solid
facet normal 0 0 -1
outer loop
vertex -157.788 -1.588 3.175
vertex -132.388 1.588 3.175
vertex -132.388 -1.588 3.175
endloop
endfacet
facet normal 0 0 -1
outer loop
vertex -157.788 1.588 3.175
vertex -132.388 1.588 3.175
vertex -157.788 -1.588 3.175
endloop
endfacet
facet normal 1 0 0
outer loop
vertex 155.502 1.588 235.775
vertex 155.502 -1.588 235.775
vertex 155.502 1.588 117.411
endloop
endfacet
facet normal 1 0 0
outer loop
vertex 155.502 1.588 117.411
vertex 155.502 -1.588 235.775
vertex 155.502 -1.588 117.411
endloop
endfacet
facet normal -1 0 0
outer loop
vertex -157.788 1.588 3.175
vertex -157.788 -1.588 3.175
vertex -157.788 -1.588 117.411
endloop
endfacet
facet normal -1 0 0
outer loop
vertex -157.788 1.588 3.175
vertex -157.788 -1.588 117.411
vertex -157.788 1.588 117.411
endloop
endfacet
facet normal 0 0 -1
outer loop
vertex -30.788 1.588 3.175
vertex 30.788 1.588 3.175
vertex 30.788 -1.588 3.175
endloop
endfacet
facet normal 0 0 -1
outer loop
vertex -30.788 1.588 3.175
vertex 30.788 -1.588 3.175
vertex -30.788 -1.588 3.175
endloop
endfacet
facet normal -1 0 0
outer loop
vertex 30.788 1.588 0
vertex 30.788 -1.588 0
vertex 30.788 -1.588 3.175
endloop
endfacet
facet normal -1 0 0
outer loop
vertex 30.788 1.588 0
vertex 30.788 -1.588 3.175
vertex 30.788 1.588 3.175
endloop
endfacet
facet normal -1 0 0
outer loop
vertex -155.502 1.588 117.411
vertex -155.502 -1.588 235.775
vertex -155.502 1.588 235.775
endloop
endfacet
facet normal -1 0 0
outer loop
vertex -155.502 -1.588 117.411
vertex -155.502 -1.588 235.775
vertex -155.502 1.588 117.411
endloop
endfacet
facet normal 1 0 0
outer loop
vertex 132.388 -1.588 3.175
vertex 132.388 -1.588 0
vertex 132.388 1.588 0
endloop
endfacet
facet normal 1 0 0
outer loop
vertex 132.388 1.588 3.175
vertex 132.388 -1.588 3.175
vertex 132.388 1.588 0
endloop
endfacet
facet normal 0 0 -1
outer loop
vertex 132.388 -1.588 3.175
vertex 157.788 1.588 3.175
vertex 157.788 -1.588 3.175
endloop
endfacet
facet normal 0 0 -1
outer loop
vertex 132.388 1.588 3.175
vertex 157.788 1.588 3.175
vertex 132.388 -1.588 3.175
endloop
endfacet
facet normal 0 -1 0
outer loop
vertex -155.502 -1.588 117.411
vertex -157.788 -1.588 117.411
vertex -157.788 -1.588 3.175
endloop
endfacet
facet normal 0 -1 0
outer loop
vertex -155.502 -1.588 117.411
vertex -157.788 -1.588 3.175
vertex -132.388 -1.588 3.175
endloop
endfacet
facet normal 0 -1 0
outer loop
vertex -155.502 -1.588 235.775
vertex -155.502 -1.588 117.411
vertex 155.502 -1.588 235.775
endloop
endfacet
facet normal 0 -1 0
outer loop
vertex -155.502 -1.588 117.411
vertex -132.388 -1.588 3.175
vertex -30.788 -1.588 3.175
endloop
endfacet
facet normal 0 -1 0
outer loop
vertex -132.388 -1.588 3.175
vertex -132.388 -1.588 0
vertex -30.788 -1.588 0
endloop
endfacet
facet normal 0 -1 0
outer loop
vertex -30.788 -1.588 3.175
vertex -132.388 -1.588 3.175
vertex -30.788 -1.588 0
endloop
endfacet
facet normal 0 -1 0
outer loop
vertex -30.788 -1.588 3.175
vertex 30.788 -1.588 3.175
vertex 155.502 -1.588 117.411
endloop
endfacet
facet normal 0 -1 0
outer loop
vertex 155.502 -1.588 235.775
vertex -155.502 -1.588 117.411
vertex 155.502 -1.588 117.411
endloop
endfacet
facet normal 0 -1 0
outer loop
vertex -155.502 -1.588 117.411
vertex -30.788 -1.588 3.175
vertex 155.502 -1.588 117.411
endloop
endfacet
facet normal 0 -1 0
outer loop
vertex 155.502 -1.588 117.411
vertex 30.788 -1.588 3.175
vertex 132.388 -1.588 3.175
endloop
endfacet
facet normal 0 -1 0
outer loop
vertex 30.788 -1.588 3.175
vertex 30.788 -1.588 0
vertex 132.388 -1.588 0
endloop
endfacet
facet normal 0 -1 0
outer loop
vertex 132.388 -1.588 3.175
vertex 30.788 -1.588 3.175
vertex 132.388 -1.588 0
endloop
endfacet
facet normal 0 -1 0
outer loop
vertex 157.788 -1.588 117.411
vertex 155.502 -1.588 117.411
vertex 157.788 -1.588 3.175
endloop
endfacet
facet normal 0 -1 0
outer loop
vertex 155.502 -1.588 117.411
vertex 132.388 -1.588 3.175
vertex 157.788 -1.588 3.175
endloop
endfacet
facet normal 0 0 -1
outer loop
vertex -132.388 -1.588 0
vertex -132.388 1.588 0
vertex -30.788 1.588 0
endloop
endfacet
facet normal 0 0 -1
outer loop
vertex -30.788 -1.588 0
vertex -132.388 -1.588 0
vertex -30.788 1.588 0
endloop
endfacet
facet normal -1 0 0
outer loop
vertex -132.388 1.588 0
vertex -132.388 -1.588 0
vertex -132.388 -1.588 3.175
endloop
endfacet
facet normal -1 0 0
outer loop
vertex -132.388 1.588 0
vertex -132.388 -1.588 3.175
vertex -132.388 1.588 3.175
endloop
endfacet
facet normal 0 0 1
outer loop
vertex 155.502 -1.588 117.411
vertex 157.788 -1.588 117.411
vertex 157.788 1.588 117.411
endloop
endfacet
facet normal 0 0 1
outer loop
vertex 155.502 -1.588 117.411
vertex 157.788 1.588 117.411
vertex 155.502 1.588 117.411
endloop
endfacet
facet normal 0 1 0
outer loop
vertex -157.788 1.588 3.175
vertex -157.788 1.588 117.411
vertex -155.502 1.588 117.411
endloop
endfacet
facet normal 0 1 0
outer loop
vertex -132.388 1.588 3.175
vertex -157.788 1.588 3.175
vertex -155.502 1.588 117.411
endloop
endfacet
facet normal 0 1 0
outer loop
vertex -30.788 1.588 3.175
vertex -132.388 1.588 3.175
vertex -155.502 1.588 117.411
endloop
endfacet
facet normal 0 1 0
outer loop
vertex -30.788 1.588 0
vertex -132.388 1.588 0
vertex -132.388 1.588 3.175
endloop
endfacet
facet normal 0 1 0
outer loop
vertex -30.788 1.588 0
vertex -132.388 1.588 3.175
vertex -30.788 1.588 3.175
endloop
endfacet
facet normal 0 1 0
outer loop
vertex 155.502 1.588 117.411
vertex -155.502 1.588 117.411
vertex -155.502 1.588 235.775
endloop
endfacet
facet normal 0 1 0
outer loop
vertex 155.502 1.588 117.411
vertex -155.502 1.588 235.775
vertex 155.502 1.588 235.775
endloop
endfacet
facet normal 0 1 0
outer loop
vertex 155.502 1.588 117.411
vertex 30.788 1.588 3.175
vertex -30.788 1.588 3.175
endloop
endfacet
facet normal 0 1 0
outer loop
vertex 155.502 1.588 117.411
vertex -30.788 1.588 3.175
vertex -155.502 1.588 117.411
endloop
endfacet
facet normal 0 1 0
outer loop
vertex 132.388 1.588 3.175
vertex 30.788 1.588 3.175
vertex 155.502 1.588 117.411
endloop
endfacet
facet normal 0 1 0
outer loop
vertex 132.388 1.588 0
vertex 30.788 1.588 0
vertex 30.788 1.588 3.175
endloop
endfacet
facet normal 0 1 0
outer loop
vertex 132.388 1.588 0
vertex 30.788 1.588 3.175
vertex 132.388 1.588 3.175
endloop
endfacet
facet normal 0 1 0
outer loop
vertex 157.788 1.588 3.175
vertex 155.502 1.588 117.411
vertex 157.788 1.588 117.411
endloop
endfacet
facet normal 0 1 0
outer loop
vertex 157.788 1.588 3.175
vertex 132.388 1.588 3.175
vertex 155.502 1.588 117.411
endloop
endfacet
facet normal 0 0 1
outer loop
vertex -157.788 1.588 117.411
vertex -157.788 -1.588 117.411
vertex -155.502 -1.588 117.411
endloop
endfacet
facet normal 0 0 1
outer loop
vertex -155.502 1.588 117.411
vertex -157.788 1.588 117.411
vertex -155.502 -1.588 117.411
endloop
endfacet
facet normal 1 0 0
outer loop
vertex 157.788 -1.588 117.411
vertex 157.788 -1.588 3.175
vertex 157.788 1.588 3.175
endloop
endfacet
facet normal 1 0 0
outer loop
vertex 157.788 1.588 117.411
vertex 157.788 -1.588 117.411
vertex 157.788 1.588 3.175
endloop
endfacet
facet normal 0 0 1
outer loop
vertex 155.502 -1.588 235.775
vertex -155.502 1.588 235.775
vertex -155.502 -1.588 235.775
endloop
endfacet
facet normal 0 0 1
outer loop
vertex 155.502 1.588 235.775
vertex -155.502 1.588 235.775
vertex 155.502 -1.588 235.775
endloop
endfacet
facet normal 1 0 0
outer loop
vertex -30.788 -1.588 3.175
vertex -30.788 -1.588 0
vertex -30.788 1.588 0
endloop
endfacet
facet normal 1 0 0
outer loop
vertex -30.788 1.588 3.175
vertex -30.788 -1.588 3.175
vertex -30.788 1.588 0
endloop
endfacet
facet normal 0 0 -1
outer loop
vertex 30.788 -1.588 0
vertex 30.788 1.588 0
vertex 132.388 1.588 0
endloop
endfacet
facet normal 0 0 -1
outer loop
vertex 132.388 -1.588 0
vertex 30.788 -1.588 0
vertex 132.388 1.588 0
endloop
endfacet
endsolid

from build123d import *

# Parameters (mm, degrees)
SKETCH1_W           = 315.575
SKETCH1_H           = 3.175
BOSS_EXTRUDE1_DEPTH = 235.775
SKETCH3_W           = 25.4
SKETCH3_H           = 3.175
SKETCH3_W_2         = 61.575
CUT_EXTRUDE1_DEPTH  = 3.175
CUT_EXTRUDE2_START  = -3.175
SKETCH5_W           = 2.286
SKETCH5_H           = 118.364
CUT_EXTRUDE2_DEPTH  = 287.894626403


with BuildPart() as part:
    # Sketch1 → Boss-Extrude1 (new body)
    with BuildSketch(Plane.XY):
        Rectangle(SKETCH1_W, SKETCH1_H)
    extrude(amount=BOSS_EXTRUDE1_DEPTH)

    # Sketch3 → Cut-Extrude1 (cut)
    with BuildSketch(Plane(origin=(0, 0, 0), x_dir=(-1, 0, 0), z_dir=(0, 0, -1))):
        with Locations((-145.0875, 0)):
            Rectangle(SKETCH3_W, SKETCH3_H)
        Rectangle(SKETCH3_W_2, SKETCH3_H)
        with Locations((145.0875, 0)):
            Rectangle(SKETCH3_W, SKETCH3_H)
    extrude(amount=-CUT_EXTRUDE1_DEPTH, mode=Mode.SUBTRACT)

    # Sketch5 → Cut-Extrude2 (cut)
    with BuildSketch(Plane(origin=(0, 1.5875, 0), x_dir=(1, 0, 0), z_dir=(0, 1, 0)).offset(CUT_EXTRUDE2_START)):
        with Locations((-156.6445, -176.593)):
            Rectangle(SKETCH5_W, SKETCH5_H)
    cut_extrude2 = extrude(amount=CUT_EXTRUDE2_DEPTH, mode=Mode.SUBTRACT)

    # Mirror1: Cut-Extrude2 across plane
    add(cut_extrude2.mirror(Plane(origin=(0, 0, 0), x_dir=(0, 0, 1), z_dir=(1, 0, 0))), mode=Mode.SUBTRACT)


solid = part.part
